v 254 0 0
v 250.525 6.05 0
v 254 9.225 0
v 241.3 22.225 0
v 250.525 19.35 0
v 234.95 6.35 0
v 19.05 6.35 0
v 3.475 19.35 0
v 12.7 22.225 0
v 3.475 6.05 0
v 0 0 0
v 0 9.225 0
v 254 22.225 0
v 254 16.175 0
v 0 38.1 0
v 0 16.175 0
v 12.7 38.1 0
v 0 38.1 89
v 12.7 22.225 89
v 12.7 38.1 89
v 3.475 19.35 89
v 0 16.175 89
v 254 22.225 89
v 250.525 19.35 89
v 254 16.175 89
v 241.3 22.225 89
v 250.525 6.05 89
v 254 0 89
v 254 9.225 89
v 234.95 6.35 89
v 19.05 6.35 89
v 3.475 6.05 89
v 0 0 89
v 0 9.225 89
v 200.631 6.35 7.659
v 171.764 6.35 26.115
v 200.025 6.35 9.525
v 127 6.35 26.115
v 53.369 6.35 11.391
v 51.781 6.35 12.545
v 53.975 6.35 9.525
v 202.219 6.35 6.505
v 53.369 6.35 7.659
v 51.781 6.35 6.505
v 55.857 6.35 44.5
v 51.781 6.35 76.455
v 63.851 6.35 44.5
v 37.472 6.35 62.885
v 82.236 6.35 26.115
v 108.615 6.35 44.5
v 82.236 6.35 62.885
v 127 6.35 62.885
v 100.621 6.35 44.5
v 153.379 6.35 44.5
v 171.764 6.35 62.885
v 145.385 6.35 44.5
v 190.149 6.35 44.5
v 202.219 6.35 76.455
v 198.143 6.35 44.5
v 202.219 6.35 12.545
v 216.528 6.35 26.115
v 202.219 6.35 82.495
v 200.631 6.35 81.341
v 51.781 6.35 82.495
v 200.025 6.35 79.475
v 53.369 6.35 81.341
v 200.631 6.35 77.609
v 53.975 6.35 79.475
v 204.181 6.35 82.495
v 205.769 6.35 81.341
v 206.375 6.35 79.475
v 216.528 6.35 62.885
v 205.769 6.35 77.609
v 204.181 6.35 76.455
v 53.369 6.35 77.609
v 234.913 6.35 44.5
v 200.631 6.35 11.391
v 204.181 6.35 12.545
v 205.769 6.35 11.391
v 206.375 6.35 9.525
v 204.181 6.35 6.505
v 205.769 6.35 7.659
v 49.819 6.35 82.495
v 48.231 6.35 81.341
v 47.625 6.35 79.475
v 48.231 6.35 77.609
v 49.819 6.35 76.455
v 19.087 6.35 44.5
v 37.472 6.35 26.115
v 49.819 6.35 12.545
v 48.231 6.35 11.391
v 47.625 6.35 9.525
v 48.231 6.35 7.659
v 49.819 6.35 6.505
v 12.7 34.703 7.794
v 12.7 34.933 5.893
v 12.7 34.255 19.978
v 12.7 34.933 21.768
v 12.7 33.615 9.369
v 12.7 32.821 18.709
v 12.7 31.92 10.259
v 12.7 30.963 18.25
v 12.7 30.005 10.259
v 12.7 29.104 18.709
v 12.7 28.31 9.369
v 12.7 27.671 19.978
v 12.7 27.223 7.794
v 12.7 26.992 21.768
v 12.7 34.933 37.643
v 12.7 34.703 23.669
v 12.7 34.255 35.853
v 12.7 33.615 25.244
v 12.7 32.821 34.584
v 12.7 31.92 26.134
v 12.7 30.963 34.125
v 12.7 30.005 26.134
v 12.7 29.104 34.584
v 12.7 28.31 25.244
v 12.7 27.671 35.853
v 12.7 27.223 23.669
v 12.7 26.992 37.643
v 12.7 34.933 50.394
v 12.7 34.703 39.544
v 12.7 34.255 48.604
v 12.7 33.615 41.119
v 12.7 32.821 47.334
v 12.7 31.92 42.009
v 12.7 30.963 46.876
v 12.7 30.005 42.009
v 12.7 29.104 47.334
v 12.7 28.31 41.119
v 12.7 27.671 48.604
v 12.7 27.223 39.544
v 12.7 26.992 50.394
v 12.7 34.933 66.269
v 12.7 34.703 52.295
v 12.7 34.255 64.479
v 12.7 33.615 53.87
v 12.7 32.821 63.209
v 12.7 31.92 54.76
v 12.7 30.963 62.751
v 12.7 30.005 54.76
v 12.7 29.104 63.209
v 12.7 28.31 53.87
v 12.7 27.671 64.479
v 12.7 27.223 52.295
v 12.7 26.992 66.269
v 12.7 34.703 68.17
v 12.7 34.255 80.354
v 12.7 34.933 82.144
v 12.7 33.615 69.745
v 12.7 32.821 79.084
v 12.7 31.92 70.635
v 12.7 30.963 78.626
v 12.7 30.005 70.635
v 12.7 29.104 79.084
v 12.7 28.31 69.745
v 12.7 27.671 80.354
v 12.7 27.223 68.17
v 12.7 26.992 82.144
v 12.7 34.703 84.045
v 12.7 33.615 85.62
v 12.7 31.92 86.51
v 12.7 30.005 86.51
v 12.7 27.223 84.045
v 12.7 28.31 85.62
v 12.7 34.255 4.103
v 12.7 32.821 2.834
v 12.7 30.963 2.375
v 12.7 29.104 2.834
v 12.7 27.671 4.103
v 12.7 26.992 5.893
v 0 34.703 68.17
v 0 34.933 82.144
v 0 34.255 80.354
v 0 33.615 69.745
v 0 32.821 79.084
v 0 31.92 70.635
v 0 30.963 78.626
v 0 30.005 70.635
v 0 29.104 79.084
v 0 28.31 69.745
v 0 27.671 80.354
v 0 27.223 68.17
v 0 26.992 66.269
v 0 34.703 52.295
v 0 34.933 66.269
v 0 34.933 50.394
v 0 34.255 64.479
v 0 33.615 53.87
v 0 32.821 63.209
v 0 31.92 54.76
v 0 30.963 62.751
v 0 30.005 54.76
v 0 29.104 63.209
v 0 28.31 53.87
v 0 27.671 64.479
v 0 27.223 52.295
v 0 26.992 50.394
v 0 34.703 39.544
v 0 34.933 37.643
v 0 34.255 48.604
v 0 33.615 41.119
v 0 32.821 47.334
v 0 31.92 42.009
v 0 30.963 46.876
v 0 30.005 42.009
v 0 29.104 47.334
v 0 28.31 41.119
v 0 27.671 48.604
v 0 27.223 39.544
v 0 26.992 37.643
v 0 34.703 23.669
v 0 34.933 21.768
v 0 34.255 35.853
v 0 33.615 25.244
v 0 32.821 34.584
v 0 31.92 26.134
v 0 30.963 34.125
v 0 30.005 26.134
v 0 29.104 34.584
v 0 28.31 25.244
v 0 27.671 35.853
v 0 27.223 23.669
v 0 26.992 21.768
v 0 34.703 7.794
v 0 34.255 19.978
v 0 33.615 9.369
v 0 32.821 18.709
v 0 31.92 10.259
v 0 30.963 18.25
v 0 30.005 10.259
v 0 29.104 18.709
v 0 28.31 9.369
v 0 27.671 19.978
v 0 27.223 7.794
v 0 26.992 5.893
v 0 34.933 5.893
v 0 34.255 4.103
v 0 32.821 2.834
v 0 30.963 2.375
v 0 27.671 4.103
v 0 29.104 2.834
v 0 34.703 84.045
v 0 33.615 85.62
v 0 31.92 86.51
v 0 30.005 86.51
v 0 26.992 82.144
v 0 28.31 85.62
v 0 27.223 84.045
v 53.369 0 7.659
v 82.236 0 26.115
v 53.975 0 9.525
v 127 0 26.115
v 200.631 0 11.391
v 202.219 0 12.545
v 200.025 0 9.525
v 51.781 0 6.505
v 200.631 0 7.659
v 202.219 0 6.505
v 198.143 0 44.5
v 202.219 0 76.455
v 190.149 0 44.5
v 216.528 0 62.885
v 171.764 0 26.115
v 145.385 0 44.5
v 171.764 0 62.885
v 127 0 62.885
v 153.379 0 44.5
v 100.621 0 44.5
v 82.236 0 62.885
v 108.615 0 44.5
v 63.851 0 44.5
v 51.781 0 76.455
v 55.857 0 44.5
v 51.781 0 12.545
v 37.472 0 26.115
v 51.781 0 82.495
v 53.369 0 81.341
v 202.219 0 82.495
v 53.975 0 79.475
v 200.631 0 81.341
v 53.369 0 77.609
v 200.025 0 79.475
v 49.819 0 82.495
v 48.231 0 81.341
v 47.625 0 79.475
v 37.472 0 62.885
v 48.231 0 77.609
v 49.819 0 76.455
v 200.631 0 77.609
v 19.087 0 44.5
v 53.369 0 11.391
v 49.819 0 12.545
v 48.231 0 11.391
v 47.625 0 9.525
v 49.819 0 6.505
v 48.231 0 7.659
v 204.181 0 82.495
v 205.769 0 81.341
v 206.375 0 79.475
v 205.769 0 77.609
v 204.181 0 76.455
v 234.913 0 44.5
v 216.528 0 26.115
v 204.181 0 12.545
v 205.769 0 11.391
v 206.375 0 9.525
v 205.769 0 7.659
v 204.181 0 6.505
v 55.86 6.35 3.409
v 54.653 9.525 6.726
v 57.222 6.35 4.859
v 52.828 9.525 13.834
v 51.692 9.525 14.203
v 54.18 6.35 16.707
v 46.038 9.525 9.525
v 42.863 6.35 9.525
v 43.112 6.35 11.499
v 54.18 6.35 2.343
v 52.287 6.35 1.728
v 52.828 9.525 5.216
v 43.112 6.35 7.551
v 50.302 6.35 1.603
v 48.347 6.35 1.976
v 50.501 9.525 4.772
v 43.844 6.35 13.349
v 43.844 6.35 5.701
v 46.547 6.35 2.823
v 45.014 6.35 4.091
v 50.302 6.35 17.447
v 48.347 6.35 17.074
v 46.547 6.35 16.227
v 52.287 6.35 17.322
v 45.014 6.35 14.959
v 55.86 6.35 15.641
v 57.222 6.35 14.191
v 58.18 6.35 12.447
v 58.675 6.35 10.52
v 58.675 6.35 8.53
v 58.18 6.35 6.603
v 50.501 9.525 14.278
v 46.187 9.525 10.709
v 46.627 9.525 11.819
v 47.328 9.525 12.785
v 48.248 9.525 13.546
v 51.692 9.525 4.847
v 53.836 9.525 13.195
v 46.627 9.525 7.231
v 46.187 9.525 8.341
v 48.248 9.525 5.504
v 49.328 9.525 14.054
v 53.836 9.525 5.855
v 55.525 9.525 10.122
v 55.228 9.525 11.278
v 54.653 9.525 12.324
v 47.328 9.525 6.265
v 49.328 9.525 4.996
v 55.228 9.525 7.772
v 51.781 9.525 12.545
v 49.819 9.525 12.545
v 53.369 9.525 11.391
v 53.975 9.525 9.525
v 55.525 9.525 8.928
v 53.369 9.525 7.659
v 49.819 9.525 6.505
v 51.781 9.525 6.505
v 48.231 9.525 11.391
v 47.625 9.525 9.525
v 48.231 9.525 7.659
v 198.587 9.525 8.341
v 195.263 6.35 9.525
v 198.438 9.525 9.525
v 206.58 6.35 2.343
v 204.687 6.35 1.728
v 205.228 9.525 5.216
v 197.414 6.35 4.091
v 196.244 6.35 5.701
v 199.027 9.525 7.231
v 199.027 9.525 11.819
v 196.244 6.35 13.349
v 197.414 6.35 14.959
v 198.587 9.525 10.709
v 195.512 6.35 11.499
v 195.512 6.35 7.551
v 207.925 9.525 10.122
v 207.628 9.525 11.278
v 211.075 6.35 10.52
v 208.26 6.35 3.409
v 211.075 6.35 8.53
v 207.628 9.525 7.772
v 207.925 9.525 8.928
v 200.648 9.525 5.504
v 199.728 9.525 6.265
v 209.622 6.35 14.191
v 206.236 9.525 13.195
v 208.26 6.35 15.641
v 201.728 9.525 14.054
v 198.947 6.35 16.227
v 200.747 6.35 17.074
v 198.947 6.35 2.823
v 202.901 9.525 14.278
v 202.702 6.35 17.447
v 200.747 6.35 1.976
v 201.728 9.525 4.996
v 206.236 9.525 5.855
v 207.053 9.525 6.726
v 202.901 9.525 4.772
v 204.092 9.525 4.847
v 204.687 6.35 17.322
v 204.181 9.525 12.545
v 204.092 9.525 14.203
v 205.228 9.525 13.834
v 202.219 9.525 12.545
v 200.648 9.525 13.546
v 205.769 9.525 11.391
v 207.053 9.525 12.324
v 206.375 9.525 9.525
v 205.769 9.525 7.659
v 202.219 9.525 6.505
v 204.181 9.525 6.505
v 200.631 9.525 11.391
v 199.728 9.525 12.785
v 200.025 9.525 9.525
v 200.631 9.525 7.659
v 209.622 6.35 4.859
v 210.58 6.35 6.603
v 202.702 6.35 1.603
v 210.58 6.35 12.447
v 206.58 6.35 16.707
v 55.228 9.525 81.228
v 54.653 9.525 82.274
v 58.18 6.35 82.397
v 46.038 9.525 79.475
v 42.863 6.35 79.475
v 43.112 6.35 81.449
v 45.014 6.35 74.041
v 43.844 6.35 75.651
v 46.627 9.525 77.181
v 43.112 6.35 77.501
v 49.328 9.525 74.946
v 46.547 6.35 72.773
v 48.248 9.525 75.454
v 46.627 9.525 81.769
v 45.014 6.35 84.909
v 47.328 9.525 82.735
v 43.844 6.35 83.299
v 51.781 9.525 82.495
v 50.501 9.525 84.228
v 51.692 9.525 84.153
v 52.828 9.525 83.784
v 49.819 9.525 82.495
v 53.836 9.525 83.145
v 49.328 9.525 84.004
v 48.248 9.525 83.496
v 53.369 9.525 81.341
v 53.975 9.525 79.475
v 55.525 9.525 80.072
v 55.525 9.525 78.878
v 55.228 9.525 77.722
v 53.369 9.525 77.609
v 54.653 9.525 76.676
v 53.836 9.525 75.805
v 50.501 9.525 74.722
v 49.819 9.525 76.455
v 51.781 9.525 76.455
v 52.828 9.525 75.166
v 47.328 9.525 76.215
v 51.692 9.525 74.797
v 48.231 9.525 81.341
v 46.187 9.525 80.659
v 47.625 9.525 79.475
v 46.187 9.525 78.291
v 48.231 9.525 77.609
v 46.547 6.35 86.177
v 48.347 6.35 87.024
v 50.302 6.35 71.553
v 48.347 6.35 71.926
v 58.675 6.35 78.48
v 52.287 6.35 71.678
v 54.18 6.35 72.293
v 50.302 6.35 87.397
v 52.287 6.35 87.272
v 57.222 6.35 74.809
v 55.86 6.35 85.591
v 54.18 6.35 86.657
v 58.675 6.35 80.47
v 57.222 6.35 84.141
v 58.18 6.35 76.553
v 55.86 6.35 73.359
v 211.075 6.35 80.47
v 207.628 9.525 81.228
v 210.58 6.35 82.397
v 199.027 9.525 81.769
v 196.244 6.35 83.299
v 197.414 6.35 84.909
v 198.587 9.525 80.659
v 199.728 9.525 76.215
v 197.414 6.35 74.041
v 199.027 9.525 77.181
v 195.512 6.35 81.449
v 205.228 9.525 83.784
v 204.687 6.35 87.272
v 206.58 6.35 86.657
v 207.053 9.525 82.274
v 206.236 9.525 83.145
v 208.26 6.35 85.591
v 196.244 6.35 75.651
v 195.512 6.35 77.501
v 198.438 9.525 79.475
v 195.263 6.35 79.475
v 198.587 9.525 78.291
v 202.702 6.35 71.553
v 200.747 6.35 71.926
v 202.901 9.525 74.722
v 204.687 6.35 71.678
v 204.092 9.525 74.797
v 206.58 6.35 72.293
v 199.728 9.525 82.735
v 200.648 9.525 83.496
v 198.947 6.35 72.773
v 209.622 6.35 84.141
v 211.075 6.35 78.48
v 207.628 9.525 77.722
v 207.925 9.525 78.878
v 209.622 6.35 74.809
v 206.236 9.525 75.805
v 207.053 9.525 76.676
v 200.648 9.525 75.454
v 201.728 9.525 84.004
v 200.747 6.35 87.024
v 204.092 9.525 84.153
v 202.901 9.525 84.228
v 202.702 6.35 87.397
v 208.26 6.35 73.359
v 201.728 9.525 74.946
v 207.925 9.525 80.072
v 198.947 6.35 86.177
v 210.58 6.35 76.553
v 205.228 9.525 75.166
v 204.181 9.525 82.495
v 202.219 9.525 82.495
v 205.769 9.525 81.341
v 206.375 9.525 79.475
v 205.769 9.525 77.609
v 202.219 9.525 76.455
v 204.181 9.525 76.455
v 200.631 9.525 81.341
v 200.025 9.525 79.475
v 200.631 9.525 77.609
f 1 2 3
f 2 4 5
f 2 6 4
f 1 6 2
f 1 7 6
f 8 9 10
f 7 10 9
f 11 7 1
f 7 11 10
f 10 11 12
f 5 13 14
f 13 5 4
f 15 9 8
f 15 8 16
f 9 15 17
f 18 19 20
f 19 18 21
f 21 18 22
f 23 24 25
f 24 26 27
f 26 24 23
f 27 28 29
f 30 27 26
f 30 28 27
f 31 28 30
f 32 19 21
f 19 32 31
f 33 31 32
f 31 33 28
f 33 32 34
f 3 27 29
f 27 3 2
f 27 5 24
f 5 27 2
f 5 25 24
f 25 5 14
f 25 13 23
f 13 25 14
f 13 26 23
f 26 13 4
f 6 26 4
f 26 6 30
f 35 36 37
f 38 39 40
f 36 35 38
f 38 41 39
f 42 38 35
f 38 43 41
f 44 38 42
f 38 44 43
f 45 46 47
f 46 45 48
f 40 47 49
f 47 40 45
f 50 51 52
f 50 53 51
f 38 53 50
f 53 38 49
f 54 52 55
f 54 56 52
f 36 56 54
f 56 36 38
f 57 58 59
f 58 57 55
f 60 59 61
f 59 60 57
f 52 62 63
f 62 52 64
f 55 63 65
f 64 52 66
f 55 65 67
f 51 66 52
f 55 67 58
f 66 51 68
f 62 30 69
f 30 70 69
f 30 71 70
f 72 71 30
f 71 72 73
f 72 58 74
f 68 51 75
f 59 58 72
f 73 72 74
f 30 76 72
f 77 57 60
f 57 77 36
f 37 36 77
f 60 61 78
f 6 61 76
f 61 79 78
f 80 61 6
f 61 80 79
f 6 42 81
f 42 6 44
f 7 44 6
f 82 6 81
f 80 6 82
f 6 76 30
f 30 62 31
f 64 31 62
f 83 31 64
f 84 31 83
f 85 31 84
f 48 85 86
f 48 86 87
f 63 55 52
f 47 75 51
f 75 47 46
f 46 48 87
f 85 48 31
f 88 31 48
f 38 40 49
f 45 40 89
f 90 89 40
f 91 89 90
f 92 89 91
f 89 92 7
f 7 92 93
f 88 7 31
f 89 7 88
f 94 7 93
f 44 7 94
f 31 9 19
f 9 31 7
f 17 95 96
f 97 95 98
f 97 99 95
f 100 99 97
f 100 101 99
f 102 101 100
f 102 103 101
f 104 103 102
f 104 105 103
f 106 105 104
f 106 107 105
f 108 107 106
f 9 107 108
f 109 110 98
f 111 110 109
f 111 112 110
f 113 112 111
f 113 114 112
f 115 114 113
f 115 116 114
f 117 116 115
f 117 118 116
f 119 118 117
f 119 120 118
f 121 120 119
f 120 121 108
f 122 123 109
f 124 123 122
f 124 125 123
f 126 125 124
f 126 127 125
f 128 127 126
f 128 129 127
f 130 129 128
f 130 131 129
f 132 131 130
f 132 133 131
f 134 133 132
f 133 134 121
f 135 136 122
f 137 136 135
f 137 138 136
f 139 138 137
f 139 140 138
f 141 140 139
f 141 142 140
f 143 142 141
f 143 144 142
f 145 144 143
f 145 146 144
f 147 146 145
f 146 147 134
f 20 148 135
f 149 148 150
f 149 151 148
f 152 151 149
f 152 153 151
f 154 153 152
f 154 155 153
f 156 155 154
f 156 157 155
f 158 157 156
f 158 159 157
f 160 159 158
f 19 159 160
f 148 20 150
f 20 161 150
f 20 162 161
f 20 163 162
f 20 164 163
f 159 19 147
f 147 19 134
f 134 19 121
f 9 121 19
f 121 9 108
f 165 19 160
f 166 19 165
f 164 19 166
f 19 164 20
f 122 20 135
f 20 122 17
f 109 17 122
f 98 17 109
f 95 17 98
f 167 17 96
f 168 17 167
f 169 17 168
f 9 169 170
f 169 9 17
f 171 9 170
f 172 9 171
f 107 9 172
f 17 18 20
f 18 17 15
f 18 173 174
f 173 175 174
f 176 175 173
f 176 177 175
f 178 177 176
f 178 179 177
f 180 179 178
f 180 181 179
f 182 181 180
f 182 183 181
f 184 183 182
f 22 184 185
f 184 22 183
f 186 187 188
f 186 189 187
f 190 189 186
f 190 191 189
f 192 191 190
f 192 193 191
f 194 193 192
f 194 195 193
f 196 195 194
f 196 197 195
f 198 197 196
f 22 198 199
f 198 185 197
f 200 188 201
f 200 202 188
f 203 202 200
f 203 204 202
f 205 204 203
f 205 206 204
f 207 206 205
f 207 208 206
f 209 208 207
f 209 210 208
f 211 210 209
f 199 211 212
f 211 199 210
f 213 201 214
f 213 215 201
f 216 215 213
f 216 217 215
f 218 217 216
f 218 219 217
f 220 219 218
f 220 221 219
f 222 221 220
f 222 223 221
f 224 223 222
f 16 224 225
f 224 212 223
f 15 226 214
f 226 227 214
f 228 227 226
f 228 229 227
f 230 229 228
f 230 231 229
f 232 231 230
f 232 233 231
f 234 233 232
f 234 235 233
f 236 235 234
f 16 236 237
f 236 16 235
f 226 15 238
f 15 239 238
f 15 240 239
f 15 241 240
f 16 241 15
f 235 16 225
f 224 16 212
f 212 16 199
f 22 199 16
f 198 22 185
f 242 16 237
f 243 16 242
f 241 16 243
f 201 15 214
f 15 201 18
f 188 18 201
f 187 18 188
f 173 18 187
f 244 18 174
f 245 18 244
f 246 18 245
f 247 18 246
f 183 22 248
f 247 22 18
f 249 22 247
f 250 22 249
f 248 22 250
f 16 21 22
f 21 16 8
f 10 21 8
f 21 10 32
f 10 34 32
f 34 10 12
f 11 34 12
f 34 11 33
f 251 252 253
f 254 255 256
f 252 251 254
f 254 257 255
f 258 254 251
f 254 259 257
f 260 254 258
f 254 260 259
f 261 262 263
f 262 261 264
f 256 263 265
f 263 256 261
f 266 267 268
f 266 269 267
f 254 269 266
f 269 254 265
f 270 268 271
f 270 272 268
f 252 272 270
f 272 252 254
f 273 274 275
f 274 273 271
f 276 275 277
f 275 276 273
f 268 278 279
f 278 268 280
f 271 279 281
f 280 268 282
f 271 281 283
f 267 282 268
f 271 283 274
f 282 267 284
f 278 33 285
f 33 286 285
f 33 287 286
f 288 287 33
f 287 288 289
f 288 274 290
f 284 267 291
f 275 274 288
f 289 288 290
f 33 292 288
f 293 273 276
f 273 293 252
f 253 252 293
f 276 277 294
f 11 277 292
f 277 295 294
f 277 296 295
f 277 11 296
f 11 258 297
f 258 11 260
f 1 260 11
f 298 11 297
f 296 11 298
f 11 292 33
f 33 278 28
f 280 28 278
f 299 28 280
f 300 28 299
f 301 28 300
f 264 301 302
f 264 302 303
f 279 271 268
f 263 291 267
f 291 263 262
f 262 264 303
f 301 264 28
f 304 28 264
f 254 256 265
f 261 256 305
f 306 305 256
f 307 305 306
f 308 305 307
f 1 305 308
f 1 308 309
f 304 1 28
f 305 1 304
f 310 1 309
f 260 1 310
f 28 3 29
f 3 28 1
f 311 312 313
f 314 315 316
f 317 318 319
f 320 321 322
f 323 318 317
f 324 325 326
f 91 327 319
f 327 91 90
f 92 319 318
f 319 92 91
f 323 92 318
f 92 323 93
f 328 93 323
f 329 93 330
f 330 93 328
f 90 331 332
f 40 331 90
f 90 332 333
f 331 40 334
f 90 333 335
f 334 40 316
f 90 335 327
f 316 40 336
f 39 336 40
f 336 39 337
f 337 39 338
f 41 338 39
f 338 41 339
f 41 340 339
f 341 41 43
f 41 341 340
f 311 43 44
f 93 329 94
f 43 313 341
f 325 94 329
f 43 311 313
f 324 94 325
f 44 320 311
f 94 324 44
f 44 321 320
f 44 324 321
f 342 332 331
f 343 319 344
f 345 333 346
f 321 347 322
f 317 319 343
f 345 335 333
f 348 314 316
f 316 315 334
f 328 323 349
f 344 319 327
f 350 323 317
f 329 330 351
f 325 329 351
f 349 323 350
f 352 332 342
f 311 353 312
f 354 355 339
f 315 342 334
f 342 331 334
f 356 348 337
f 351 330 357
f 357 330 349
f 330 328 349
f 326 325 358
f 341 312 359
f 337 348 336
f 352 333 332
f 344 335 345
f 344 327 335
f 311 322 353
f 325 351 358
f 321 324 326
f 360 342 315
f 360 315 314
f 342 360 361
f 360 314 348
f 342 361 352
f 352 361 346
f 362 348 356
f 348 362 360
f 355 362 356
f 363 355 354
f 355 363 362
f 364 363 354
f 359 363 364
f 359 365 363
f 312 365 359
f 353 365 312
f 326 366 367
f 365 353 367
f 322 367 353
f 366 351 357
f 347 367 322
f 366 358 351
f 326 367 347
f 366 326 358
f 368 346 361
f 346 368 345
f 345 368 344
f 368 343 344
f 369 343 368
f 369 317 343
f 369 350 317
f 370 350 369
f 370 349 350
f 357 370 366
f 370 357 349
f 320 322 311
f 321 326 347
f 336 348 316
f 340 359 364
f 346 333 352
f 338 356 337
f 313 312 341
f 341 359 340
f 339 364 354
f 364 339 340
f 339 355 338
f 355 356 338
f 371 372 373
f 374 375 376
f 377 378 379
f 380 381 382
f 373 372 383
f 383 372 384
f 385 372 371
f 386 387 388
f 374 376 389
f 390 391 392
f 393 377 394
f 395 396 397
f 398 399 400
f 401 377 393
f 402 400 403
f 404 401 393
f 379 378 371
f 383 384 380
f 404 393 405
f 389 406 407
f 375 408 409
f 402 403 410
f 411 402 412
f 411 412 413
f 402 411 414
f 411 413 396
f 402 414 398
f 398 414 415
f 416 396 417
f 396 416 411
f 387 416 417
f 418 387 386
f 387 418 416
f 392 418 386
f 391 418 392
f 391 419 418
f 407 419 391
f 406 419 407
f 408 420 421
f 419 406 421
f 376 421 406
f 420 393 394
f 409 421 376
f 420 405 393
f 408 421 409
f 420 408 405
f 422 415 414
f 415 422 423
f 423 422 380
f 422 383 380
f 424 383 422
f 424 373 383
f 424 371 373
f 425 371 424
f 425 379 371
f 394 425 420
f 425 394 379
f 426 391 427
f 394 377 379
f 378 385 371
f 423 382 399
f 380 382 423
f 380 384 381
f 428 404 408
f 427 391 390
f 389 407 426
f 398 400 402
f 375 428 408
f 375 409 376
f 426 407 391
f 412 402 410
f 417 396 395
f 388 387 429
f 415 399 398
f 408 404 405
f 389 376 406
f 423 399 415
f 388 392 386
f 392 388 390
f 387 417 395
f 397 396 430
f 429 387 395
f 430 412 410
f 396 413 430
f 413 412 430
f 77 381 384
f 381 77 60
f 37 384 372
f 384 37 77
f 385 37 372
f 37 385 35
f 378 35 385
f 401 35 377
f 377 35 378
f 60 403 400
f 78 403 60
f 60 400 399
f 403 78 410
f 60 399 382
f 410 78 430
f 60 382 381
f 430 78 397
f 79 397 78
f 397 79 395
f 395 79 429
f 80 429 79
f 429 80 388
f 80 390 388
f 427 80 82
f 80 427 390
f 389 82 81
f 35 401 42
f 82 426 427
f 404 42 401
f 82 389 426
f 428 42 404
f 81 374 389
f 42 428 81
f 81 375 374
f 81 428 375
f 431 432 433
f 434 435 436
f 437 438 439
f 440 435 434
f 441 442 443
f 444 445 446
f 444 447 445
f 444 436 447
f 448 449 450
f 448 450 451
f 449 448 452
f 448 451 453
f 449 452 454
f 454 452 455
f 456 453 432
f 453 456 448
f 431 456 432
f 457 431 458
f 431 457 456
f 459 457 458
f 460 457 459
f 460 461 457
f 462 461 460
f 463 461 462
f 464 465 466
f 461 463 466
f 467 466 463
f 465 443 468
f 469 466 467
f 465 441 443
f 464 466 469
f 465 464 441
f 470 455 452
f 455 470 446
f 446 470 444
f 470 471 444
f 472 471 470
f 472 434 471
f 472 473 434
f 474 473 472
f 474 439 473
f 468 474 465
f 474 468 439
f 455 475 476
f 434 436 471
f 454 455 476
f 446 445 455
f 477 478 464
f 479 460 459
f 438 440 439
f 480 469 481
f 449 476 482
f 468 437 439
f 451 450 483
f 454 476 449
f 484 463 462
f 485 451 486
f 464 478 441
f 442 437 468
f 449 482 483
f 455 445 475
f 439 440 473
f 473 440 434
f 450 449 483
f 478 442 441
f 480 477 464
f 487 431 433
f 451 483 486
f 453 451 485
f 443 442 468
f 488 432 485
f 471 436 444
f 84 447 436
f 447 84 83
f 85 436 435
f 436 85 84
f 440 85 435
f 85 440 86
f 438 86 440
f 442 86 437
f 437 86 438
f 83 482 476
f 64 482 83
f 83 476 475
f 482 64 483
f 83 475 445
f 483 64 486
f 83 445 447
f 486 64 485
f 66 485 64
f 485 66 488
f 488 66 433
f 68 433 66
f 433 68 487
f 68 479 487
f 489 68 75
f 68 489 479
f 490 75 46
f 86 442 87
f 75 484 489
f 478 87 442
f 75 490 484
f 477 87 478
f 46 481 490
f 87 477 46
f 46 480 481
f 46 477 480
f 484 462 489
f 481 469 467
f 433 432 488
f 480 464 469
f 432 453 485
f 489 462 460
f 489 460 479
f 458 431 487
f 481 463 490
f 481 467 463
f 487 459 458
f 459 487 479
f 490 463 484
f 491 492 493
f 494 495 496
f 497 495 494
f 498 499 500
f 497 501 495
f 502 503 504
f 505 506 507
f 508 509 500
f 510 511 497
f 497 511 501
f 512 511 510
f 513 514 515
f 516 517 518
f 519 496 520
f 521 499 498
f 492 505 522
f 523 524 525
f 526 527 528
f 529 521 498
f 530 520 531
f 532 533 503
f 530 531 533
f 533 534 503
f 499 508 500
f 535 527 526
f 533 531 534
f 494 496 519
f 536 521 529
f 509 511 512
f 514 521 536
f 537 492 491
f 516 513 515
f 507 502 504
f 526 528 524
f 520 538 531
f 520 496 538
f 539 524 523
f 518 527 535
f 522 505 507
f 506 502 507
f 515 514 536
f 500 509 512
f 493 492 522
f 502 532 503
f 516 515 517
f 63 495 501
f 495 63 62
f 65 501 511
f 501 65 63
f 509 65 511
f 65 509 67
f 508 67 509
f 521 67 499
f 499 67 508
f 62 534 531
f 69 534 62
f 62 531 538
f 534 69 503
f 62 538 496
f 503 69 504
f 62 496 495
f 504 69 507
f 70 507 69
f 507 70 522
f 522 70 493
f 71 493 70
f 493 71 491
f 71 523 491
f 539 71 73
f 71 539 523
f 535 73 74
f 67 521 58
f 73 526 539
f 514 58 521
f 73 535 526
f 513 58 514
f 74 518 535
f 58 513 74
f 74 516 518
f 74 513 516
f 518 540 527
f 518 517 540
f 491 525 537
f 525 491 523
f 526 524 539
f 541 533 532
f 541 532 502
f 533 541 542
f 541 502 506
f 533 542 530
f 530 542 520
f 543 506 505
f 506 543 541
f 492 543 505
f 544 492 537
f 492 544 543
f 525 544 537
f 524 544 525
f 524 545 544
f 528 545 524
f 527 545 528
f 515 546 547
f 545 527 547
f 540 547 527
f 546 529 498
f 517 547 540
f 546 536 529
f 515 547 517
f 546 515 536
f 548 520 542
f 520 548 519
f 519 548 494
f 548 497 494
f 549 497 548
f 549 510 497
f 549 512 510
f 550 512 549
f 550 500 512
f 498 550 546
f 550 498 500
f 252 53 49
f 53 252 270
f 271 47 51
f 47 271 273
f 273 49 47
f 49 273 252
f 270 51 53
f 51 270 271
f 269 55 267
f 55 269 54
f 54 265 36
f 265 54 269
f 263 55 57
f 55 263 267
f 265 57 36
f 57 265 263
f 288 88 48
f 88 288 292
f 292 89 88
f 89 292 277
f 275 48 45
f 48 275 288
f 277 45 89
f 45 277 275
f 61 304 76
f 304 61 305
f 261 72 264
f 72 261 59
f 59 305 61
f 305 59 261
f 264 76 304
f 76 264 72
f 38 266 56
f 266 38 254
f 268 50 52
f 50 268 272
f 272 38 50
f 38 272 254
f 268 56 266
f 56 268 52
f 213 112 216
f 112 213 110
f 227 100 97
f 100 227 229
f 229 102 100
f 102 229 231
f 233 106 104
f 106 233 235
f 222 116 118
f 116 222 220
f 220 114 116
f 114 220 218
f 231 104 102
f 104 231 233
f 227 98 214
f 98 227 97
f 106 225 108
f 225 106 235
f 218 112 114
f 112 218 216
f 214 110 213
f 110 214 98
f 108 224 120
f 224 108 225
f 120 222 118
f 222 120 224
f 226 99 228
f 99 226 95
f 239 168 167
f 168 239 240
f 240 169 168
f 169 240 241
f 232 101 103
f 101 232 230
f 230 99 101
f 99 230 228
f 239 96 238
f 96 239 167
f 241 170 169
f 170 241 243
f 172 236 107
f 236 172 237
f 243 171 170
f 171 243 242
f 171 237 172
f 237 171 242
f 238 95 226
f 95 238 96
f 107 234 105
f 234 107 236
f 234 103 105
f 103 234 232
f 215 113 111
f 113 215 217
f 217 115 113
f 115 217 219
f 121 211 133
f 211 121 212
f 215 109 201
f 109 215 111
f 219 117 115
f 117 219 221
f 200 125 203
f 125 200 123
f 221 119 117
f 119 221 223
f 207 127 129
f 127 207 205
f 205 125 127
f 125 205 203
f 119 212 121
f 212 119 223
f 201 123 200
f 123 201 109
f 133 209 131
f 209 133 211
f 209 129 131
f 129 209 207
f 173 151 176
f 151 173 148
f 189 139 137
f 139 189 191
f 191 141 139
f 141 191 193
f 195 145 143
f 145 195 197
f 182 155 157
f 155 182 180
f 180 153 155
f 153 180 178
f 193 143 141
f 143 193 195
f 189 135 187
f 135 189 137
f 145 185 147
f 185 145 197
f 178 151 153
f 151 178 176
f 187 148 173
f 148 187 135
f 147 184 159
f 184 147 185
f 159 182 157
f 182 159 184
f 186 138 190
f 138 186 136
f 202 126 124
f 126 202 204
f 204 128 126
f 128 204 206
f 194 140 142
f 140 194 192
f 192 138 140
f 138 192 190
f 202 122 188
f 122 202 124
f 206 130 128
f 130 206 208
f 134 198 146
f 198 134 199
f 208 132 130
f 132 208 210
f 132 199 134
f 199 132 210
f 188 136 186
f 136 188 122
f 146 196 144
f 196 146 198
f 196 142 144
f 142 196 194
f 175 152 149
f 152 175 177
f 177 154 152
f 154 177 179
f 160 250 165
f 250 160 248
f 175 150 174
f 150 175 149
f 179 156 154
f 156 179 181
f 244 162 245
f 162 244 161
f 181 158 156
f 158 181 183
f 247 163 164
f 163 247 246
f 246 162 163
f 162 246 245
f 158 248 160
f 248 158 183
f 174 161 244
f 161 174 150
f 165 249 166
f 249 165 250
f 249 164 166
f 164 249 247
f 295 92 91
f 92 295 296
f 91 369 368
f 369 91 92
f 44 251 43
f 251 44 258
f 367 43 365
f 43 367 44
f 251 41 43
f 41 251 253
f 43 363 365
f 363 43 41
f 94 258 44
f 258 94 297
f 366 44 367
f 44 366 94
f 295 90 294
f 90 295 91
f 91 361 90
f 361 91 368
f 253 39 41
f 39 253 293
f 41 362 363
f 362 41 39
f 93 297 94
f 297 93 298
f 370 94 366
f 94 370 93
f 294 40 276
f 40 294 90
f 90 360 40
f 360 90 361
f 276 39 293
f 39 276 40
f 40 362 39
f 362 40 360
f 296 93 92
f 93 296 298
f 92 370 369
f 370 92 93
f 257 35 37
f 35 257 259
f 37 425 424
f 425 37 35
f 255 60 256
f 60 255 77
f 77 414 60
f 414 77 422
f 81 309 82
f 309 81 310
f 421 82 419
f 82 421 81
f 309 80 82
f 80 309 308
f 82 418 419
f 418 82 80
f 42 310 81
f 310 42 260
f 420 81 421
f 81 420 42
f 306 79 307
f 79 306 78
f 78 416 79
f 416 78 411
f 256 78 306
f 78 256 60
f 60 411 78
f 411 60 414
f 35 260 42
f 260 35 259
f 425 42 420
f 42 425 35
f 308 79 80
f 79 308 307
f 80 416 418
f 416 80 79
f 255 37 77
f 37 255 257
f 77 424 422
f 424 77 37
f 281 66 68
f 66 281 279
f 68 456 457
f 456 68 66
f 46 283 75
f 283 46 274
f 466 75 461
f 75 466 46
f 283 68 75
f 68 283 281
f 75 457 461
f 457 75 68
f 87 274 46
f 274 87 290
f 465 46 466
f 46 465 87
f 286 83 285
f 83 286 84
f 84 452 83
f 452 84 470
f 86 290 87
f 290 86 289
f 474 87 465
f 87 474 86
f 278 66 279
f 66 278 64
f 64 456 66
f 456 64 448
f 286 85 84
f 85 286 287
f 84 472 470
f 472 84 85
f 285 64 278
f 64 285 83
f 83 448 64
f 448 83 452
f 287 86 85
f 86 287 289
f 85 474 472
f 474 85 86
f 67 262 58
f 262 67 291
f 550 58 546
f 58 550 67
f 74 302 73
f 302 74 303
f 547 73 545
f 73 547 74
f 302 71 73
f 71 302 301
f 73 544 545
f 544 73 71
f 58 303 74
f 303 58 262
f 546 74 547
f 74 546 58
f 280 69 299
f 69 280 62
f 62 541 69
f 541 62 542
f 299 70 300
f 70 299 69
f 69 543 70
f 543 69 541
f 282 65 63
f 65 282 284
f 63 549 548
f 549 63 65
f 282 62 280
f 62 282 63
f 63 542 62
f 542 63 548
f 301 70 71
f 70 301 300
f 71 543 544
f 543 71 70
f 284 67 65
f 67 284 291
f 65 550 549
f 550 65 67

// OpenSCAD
include <MCAD/units.scad>

// Height in mm
height = 89;

// Has rackmount rail?
has_rail = true;

width = 10 * inch;
thick = (7/8) * inch;
ledge = (1/2) * inch;
wall = (1/4) * inch;
slope = (1/4) * inch;
rail = 0.625 * inch;
hole_top_offset = (3/8) * inch;
hole_side_offset = 2 * inch;
hole_dia = (1/4) * inch;
gap = 26 * mm;
gap_spacing = 1.414 * gap + 8;
h_gap_span = (width / 2) - ledge - slope;
v_gap_span = (height / 2) - hole_top_offset;
bump_height = (1/8) * inch;
bump_dia = (3/8) * inch;
rail_dia = 8 * mm;
rail_offset = 0.344 * inch;
rail_hole = 0.625 * inch;
rail_spacing = 1.752 * inch;

tol = 0.3 * mm;

module gap_row() {
  union() {
    rotate([-90, 45, 0])
      cube(gap, center = true);
    
    for(dx=[gap_spacing:gap_spacing:h_gap_span]) {
      translate([-dx, 0, 0])
        rotate([-90, 45, 0])
        cube(gap, center = true);
      translate([dx, 0, 0])
        rotate([-90, 45, 0])
        cube(gap, center = true);
    }
  }
}

module gaps() {
  union() {
    if ((v_gap_span % gap_spacing) < (gap_spacing / 2)) {
      for(dz=[gap_spacing / 2:gap_spacing:v_gap_span]) {
        translate([0, 0, -dz])
          gap_row();
        translate([0, 0, dz])
          gap_row();
      }
    } else {
      gap_row();
      
      for(dz=[gap_spacing:gap_spacing:v_gap_span]) {
        translate([0, 0, -dz])
          gap_row();
        translate([0, 0, dz])
          gap_row();
      }
    }
  }
}

module bump() {
  rotate_extrude() {
    poly = [
      [0, 0],
      [0, -bump_height],
      [bump_dia / 2, -bump_height],
      [(bump_dia / 2) + bump_height, 0],
      [0, 0]];
    polygon(poly);
  }
}

module rail_holes() {
  union() {
    cylinder(h = ledge, d = rail_dia);
    translate([rail_hole, 0, 0])
      cylinder(h = ledge, d = rail_dia);
    translate([-rail_hole, 0, 0])
      cylinder(h = ledge, d = rail_dia);
  }
}

difference() {
  union() {
    linear_extrude(height) {
      poly_0 = [
        [0, 0],
        [0, ((3/8) * inch) - tol],
        [((1/8) * inch) + tol, ((1/4) * inch) - tol],
        [((1/8) * inch) + tol, ((3/4) * inch) + tol],
        [0, ((5/8) * inch) + tol],
        [0, thick]];
      poly_1 = [
        [ledge, thick],
        [ledge + slope, wall],
        [width - slope - ledge, wall],
        [width - ledge, thick],
        [width, thick],
        [width, ((5/8) * inch) + tol],
        [width - ((1/8) * inch) - tol, ((3/4) * inch) + tol],
        [width - ((1/8) * inch) - tol, ((1/4) * inch) - tol],
        [width, ((3/8) * inch) - tol],
        [width, 0],
        [0,0]];
      if (has_rail) {
        polygon(concat(poly_0, [[0, thick + rail], [ledge, thick + rail]], poly_1));
      } else {
        polygon(concat(poly_0, poly_1));
      }
    }
    translate([hole_side_offset, wall, hole_top_offset])
      rotate([90, 0, 0])
      bump();
    translate([width - hole_side_offset, wall, hole_top_offset])
      rotate([90, 0, 0])
      bump();
    translate([hole_side_offset, wall, height - hole_top_offset])
      rotate([90, 0, 0])
      bump();
    translate([width - hole_side_offset, wall, height - hole_top_offset])
      rotate([90, 0, 0])
      bump();
  }
  
  translate([hole_side_offset, 0, hole_top_offset])
    rotate([-90, 0, 0])
    cylinder(h = thick, d = hole_dia);
  translate([width - hole_side_offset, 0, hole_top_offset])
    rotate([-90, 0, 0])
    cylinder(h = thick, d = hole_dia);
  
  translate([hole_side_offset, 0, height - hole_top_offset])
    rotate([-90, 0, 0])
    cylinder(h = thick, d = hole_dia);
  translate([width - hole_side_offset, 0, height - hole_top_offset])
    rotate([-90, 0, 0])
    cylinder(h = thick, d = hole_dia);
  
  translate([width / 2, 0, height / 2])
    gaps();
  
  if (has_rail) {
    for(dz=[(rail_spacing / 2):rail_spacing:height]) {
      translate([0, thick + rail_offset, dz])
        rotate([0, 90, 0])
        rail_holes();
    }
  }
}
